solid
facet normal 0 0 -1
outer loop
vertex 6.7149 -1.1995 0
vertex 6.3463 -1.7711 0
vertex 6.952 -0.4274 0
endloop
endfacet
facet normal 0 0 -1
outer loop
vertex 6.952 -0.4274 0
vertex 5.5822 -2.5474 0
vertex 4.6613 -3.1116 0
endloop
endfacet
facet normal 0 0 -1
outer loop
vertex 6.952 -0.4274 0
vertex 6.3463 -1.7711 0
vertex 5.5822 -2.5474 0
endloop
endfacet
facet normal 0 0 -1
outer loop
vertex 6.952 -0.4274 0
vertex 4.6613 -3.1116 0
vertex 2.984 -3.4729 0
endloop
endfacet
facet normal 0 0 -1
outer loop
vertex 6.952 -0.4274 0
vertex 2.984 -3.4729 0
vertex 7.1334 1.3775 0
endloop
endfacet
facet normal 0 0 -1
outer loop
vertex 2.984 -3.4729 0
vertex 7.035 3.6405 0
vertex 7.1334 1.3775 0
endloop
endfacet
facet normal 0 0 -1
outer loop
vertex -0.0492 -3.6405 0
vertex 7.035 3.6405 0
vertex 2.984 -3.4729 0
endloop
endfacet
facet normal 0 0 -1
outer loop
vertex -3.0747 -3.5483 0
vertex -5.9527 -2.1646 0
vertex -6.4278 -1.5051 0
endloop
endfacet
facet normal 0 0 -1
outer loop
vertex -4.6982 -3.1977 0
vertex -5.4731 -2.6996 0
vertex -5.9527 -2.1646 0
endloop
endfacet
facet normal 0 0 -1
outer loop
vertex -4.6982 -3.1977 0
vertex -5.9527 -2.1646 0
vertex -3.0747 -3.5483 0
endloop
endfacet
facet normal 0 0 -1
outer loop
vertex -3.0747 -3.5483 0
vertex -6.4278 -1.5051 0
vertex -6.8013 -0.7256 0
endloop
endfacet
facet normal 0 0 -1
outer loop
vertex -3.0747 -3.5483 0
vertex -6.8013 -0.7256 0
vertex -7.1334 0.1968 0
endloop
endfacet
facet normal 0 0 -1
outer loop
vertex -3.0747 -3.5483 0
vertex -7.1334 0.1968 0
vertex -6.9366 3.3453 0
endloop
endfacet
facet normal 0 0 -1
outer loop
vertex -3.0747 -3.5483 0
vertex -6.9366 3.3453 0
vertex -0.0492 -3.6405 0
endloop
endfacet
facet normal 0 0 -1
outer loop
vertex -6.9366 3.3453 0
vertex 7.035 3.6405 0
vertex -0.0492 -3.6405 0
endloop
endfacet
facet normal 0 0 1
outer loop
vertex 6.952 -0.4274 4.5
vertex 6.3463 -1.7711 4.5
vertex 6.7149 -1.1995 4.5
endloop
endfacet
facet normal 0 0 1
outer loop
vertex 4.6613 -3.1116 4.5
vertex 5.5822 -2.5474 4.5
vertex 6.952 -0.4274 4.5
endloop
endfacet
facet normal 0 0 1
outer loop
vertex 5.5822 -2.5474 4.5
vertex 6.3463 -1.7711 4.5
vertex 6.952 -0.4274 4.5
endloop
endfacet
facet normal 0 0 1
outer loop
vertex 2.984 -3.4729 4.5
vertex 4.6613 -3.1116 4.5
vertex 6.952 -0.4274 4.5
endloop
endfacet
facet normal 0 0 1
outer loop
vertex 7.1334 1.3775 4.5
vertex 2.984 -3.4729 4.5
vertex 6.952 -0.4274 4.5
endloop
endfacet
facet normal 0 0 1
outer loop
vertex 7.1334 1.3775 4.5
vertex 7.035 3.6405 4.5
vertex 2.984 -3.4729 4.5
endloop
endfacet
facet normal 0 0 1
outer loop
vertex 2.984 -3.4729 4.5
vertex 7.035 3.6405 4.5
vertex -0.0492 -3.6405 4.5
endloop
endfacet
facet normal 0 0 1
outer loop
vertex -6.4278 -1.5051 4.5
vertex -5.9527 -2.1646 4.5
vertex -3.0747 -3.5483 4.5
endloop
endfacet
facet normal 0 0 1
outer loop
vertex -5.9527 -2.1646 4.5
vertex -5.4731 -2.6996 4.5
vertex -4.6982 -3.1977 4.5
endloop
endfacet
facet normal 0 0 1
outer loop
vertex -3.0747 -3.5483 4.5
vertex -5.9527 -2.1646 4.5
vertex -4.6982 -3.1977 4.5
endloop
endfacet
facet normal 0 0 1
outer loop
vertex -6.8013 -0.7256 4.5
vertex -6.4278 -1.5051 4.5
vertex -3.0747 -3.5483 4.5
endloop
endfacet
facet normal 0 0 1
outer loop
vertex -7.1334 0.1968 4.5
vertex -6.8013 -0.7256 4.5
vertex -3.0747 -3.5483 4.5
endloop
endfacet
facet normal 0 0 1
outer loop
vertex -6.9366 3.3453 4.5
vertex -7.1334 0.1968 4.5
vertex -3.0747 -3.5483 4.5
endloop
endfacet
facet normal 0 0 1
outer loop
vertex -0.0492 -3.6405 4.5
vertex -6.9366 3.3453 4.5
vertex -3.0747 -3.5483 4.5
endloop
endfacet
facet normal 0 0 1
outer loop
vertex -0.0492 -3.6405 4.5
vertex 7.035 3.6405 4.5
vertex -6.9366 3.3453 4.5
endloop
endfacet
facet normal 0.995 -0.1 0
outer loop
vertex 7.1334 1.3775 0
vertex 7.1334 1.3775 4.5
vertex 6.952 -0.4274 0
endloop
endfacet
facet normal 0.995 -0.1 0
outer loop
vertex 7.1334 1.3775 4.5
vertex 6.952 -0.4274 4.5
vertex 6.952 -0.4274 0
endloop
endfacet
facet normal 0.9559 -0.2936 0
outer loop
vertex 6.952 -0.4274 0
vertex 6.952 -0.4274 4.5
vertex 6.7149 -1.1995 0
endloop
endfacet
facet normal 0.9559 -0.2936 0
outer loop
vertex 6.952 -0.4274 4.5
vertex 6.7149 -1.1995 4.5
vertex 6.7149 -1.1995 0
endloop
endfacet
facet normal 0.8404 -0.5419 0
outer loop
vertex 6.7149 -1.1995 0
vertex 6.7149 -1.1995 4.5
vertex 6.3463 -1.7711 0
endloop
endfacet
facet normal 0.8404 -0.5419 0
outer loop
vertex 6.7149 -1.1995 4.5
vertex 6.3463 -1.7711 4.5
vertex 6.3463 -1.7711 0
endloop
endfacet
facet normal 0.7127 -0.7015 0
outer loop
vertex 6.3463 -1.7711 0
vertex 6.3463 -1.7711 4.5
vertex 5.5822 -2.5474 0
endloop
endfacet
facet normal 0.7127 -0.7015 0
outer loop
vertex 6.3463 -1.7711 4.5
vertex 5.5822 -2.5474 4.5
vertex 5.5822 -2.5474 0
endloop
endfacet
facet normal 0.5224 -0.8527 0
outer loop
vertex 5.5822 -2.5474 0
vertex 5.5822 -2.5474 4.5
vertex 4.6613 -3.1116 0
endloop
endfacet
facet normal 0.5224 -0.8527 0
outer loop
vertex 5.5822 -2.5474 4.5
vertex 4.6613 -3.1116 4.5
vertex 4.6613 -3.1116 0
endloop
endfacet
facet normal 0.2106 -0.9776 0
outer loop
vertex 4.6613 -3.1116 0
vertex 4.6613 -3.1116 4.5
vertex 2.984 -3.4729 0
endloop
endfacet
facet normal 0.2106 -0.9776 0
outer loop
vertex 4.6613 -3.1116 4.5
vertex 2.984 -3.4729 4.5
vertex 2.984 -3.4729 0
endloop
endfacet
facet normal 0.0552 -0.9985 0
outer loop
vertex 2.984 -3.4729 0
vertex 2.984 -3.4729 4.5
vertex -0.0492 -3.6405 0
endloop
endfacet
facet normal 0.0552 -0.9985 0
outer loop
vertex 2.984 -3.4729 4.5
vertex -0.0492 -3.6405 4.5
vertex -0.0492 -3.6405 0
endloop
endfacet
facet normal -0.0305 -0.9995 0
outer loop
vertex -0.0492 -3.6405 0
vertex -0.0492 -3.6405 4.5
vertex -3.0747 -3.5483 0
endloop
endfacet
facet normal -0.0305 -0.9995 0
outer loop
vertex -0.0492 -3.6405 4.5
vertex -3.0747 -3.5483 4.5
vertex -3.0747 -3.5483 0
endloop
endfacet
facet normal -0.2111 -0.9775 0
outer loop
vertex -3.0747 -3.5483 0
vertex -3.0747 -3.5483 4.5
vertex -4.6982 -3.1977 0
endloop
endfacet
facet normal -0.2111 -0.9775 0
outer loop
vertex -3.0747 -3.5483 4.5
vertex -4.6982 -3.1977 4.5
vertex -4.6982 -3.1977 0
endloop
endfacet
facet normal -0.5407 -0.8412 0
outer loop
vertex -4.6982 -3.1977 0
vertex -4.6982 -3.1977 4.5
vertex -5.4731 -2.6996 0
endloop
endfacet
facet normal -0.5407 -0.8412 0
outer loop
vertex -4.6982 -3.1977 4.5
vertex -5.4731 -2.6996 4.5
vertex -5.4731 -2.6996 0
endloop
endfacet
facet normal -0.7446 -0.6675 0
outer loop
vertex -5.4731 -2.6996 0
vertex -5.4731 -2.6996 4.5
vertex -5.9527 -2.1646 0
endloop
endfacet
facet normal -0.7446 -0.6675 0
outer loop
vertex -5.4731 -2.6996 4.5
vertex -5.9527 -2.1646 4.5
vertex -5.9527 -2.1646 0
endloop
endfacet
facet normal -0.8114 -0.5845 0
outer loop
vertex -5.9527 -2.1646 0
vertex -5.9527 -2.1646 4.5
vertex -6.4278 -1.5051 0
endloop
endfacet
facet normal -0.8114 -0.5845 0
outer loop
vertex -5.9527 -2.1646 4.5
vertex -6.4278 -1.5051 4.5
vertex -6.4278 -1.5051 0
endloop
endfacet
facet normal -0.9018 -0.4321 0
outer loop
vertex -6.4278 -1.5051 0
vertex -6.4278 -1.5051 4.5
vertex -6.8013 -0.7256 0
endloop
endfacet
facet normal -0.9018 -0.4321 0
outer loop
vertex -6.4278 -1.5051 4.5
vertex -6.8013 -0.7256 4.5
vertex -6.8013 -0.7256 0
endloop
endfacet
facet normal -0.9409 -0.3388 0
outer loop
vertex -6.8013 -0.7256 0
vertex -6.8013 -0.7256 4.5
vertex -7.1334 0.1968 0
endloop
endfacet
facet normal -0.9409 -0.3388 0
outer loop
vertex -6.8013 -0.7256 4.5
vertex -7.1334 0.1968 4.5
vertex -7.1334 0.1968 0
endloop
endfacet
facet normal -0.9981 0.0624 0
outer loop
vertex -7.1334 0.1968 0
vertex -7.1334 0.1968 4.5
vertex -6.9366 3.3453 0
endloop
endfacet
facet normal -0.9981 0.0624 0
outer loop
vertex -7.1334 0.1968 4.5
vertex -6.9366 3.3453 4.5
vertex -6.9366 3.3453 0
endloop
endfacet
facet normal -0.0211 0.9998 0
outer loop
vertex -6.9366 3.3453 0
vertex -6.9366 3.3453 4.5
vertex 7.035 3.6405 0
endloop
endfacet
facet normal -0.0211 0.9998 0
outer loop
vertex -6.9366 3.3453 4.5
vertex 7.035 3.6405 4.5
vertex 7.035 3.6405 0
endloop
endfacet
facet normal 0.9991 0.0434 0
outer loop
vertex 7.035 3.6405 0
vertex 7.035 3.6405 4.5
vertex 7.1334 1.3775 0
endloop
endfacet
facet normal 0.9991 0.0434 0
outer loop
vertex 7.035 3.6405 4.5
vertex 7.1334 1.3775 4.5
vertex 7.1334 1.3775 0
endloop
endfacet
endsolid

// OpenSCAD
// Module names are of the form poly_<inkscape-path-id>().  As a result,
// you can associate a polygon in this OpenSCAD program with the corresponding
// SVG element in the Inkscape document by looking for the XML element with
// the attribute id="inkscape-path-id".

// fudge value is used to ensure that subtracted solids are a tad taller
// in the z dimension than the polygon being subtracted from.  This helps
// keep the resulting .stl file manifold.
fudge = 0.1;

module poly_path4168(h)
{
  scale([25.4/90, -25.4/90, 1]) union()
  {
    linear_extrude(height=h)
      polygon([[-24.578670,-11.853522],[-25.275895,-0.697255],[-24.099263,2.571179],[-22.775549,5.333003],[-21.092304,7.669930],[-19.392711,9.565625],[-16.647223,11.330580],[-10.894776,12.572582],[-0.174310,12.899420],[10.573386,12.305658],[16.516487,11.025523],[19.779476,9.026333],[22.486835,6.275403],[23.792846,4.250332],[24.633105,1.514378],[25.275894,-4.880861],[24.927259,-12.899420]]);
  }
}

poly_path4168(4.5);
